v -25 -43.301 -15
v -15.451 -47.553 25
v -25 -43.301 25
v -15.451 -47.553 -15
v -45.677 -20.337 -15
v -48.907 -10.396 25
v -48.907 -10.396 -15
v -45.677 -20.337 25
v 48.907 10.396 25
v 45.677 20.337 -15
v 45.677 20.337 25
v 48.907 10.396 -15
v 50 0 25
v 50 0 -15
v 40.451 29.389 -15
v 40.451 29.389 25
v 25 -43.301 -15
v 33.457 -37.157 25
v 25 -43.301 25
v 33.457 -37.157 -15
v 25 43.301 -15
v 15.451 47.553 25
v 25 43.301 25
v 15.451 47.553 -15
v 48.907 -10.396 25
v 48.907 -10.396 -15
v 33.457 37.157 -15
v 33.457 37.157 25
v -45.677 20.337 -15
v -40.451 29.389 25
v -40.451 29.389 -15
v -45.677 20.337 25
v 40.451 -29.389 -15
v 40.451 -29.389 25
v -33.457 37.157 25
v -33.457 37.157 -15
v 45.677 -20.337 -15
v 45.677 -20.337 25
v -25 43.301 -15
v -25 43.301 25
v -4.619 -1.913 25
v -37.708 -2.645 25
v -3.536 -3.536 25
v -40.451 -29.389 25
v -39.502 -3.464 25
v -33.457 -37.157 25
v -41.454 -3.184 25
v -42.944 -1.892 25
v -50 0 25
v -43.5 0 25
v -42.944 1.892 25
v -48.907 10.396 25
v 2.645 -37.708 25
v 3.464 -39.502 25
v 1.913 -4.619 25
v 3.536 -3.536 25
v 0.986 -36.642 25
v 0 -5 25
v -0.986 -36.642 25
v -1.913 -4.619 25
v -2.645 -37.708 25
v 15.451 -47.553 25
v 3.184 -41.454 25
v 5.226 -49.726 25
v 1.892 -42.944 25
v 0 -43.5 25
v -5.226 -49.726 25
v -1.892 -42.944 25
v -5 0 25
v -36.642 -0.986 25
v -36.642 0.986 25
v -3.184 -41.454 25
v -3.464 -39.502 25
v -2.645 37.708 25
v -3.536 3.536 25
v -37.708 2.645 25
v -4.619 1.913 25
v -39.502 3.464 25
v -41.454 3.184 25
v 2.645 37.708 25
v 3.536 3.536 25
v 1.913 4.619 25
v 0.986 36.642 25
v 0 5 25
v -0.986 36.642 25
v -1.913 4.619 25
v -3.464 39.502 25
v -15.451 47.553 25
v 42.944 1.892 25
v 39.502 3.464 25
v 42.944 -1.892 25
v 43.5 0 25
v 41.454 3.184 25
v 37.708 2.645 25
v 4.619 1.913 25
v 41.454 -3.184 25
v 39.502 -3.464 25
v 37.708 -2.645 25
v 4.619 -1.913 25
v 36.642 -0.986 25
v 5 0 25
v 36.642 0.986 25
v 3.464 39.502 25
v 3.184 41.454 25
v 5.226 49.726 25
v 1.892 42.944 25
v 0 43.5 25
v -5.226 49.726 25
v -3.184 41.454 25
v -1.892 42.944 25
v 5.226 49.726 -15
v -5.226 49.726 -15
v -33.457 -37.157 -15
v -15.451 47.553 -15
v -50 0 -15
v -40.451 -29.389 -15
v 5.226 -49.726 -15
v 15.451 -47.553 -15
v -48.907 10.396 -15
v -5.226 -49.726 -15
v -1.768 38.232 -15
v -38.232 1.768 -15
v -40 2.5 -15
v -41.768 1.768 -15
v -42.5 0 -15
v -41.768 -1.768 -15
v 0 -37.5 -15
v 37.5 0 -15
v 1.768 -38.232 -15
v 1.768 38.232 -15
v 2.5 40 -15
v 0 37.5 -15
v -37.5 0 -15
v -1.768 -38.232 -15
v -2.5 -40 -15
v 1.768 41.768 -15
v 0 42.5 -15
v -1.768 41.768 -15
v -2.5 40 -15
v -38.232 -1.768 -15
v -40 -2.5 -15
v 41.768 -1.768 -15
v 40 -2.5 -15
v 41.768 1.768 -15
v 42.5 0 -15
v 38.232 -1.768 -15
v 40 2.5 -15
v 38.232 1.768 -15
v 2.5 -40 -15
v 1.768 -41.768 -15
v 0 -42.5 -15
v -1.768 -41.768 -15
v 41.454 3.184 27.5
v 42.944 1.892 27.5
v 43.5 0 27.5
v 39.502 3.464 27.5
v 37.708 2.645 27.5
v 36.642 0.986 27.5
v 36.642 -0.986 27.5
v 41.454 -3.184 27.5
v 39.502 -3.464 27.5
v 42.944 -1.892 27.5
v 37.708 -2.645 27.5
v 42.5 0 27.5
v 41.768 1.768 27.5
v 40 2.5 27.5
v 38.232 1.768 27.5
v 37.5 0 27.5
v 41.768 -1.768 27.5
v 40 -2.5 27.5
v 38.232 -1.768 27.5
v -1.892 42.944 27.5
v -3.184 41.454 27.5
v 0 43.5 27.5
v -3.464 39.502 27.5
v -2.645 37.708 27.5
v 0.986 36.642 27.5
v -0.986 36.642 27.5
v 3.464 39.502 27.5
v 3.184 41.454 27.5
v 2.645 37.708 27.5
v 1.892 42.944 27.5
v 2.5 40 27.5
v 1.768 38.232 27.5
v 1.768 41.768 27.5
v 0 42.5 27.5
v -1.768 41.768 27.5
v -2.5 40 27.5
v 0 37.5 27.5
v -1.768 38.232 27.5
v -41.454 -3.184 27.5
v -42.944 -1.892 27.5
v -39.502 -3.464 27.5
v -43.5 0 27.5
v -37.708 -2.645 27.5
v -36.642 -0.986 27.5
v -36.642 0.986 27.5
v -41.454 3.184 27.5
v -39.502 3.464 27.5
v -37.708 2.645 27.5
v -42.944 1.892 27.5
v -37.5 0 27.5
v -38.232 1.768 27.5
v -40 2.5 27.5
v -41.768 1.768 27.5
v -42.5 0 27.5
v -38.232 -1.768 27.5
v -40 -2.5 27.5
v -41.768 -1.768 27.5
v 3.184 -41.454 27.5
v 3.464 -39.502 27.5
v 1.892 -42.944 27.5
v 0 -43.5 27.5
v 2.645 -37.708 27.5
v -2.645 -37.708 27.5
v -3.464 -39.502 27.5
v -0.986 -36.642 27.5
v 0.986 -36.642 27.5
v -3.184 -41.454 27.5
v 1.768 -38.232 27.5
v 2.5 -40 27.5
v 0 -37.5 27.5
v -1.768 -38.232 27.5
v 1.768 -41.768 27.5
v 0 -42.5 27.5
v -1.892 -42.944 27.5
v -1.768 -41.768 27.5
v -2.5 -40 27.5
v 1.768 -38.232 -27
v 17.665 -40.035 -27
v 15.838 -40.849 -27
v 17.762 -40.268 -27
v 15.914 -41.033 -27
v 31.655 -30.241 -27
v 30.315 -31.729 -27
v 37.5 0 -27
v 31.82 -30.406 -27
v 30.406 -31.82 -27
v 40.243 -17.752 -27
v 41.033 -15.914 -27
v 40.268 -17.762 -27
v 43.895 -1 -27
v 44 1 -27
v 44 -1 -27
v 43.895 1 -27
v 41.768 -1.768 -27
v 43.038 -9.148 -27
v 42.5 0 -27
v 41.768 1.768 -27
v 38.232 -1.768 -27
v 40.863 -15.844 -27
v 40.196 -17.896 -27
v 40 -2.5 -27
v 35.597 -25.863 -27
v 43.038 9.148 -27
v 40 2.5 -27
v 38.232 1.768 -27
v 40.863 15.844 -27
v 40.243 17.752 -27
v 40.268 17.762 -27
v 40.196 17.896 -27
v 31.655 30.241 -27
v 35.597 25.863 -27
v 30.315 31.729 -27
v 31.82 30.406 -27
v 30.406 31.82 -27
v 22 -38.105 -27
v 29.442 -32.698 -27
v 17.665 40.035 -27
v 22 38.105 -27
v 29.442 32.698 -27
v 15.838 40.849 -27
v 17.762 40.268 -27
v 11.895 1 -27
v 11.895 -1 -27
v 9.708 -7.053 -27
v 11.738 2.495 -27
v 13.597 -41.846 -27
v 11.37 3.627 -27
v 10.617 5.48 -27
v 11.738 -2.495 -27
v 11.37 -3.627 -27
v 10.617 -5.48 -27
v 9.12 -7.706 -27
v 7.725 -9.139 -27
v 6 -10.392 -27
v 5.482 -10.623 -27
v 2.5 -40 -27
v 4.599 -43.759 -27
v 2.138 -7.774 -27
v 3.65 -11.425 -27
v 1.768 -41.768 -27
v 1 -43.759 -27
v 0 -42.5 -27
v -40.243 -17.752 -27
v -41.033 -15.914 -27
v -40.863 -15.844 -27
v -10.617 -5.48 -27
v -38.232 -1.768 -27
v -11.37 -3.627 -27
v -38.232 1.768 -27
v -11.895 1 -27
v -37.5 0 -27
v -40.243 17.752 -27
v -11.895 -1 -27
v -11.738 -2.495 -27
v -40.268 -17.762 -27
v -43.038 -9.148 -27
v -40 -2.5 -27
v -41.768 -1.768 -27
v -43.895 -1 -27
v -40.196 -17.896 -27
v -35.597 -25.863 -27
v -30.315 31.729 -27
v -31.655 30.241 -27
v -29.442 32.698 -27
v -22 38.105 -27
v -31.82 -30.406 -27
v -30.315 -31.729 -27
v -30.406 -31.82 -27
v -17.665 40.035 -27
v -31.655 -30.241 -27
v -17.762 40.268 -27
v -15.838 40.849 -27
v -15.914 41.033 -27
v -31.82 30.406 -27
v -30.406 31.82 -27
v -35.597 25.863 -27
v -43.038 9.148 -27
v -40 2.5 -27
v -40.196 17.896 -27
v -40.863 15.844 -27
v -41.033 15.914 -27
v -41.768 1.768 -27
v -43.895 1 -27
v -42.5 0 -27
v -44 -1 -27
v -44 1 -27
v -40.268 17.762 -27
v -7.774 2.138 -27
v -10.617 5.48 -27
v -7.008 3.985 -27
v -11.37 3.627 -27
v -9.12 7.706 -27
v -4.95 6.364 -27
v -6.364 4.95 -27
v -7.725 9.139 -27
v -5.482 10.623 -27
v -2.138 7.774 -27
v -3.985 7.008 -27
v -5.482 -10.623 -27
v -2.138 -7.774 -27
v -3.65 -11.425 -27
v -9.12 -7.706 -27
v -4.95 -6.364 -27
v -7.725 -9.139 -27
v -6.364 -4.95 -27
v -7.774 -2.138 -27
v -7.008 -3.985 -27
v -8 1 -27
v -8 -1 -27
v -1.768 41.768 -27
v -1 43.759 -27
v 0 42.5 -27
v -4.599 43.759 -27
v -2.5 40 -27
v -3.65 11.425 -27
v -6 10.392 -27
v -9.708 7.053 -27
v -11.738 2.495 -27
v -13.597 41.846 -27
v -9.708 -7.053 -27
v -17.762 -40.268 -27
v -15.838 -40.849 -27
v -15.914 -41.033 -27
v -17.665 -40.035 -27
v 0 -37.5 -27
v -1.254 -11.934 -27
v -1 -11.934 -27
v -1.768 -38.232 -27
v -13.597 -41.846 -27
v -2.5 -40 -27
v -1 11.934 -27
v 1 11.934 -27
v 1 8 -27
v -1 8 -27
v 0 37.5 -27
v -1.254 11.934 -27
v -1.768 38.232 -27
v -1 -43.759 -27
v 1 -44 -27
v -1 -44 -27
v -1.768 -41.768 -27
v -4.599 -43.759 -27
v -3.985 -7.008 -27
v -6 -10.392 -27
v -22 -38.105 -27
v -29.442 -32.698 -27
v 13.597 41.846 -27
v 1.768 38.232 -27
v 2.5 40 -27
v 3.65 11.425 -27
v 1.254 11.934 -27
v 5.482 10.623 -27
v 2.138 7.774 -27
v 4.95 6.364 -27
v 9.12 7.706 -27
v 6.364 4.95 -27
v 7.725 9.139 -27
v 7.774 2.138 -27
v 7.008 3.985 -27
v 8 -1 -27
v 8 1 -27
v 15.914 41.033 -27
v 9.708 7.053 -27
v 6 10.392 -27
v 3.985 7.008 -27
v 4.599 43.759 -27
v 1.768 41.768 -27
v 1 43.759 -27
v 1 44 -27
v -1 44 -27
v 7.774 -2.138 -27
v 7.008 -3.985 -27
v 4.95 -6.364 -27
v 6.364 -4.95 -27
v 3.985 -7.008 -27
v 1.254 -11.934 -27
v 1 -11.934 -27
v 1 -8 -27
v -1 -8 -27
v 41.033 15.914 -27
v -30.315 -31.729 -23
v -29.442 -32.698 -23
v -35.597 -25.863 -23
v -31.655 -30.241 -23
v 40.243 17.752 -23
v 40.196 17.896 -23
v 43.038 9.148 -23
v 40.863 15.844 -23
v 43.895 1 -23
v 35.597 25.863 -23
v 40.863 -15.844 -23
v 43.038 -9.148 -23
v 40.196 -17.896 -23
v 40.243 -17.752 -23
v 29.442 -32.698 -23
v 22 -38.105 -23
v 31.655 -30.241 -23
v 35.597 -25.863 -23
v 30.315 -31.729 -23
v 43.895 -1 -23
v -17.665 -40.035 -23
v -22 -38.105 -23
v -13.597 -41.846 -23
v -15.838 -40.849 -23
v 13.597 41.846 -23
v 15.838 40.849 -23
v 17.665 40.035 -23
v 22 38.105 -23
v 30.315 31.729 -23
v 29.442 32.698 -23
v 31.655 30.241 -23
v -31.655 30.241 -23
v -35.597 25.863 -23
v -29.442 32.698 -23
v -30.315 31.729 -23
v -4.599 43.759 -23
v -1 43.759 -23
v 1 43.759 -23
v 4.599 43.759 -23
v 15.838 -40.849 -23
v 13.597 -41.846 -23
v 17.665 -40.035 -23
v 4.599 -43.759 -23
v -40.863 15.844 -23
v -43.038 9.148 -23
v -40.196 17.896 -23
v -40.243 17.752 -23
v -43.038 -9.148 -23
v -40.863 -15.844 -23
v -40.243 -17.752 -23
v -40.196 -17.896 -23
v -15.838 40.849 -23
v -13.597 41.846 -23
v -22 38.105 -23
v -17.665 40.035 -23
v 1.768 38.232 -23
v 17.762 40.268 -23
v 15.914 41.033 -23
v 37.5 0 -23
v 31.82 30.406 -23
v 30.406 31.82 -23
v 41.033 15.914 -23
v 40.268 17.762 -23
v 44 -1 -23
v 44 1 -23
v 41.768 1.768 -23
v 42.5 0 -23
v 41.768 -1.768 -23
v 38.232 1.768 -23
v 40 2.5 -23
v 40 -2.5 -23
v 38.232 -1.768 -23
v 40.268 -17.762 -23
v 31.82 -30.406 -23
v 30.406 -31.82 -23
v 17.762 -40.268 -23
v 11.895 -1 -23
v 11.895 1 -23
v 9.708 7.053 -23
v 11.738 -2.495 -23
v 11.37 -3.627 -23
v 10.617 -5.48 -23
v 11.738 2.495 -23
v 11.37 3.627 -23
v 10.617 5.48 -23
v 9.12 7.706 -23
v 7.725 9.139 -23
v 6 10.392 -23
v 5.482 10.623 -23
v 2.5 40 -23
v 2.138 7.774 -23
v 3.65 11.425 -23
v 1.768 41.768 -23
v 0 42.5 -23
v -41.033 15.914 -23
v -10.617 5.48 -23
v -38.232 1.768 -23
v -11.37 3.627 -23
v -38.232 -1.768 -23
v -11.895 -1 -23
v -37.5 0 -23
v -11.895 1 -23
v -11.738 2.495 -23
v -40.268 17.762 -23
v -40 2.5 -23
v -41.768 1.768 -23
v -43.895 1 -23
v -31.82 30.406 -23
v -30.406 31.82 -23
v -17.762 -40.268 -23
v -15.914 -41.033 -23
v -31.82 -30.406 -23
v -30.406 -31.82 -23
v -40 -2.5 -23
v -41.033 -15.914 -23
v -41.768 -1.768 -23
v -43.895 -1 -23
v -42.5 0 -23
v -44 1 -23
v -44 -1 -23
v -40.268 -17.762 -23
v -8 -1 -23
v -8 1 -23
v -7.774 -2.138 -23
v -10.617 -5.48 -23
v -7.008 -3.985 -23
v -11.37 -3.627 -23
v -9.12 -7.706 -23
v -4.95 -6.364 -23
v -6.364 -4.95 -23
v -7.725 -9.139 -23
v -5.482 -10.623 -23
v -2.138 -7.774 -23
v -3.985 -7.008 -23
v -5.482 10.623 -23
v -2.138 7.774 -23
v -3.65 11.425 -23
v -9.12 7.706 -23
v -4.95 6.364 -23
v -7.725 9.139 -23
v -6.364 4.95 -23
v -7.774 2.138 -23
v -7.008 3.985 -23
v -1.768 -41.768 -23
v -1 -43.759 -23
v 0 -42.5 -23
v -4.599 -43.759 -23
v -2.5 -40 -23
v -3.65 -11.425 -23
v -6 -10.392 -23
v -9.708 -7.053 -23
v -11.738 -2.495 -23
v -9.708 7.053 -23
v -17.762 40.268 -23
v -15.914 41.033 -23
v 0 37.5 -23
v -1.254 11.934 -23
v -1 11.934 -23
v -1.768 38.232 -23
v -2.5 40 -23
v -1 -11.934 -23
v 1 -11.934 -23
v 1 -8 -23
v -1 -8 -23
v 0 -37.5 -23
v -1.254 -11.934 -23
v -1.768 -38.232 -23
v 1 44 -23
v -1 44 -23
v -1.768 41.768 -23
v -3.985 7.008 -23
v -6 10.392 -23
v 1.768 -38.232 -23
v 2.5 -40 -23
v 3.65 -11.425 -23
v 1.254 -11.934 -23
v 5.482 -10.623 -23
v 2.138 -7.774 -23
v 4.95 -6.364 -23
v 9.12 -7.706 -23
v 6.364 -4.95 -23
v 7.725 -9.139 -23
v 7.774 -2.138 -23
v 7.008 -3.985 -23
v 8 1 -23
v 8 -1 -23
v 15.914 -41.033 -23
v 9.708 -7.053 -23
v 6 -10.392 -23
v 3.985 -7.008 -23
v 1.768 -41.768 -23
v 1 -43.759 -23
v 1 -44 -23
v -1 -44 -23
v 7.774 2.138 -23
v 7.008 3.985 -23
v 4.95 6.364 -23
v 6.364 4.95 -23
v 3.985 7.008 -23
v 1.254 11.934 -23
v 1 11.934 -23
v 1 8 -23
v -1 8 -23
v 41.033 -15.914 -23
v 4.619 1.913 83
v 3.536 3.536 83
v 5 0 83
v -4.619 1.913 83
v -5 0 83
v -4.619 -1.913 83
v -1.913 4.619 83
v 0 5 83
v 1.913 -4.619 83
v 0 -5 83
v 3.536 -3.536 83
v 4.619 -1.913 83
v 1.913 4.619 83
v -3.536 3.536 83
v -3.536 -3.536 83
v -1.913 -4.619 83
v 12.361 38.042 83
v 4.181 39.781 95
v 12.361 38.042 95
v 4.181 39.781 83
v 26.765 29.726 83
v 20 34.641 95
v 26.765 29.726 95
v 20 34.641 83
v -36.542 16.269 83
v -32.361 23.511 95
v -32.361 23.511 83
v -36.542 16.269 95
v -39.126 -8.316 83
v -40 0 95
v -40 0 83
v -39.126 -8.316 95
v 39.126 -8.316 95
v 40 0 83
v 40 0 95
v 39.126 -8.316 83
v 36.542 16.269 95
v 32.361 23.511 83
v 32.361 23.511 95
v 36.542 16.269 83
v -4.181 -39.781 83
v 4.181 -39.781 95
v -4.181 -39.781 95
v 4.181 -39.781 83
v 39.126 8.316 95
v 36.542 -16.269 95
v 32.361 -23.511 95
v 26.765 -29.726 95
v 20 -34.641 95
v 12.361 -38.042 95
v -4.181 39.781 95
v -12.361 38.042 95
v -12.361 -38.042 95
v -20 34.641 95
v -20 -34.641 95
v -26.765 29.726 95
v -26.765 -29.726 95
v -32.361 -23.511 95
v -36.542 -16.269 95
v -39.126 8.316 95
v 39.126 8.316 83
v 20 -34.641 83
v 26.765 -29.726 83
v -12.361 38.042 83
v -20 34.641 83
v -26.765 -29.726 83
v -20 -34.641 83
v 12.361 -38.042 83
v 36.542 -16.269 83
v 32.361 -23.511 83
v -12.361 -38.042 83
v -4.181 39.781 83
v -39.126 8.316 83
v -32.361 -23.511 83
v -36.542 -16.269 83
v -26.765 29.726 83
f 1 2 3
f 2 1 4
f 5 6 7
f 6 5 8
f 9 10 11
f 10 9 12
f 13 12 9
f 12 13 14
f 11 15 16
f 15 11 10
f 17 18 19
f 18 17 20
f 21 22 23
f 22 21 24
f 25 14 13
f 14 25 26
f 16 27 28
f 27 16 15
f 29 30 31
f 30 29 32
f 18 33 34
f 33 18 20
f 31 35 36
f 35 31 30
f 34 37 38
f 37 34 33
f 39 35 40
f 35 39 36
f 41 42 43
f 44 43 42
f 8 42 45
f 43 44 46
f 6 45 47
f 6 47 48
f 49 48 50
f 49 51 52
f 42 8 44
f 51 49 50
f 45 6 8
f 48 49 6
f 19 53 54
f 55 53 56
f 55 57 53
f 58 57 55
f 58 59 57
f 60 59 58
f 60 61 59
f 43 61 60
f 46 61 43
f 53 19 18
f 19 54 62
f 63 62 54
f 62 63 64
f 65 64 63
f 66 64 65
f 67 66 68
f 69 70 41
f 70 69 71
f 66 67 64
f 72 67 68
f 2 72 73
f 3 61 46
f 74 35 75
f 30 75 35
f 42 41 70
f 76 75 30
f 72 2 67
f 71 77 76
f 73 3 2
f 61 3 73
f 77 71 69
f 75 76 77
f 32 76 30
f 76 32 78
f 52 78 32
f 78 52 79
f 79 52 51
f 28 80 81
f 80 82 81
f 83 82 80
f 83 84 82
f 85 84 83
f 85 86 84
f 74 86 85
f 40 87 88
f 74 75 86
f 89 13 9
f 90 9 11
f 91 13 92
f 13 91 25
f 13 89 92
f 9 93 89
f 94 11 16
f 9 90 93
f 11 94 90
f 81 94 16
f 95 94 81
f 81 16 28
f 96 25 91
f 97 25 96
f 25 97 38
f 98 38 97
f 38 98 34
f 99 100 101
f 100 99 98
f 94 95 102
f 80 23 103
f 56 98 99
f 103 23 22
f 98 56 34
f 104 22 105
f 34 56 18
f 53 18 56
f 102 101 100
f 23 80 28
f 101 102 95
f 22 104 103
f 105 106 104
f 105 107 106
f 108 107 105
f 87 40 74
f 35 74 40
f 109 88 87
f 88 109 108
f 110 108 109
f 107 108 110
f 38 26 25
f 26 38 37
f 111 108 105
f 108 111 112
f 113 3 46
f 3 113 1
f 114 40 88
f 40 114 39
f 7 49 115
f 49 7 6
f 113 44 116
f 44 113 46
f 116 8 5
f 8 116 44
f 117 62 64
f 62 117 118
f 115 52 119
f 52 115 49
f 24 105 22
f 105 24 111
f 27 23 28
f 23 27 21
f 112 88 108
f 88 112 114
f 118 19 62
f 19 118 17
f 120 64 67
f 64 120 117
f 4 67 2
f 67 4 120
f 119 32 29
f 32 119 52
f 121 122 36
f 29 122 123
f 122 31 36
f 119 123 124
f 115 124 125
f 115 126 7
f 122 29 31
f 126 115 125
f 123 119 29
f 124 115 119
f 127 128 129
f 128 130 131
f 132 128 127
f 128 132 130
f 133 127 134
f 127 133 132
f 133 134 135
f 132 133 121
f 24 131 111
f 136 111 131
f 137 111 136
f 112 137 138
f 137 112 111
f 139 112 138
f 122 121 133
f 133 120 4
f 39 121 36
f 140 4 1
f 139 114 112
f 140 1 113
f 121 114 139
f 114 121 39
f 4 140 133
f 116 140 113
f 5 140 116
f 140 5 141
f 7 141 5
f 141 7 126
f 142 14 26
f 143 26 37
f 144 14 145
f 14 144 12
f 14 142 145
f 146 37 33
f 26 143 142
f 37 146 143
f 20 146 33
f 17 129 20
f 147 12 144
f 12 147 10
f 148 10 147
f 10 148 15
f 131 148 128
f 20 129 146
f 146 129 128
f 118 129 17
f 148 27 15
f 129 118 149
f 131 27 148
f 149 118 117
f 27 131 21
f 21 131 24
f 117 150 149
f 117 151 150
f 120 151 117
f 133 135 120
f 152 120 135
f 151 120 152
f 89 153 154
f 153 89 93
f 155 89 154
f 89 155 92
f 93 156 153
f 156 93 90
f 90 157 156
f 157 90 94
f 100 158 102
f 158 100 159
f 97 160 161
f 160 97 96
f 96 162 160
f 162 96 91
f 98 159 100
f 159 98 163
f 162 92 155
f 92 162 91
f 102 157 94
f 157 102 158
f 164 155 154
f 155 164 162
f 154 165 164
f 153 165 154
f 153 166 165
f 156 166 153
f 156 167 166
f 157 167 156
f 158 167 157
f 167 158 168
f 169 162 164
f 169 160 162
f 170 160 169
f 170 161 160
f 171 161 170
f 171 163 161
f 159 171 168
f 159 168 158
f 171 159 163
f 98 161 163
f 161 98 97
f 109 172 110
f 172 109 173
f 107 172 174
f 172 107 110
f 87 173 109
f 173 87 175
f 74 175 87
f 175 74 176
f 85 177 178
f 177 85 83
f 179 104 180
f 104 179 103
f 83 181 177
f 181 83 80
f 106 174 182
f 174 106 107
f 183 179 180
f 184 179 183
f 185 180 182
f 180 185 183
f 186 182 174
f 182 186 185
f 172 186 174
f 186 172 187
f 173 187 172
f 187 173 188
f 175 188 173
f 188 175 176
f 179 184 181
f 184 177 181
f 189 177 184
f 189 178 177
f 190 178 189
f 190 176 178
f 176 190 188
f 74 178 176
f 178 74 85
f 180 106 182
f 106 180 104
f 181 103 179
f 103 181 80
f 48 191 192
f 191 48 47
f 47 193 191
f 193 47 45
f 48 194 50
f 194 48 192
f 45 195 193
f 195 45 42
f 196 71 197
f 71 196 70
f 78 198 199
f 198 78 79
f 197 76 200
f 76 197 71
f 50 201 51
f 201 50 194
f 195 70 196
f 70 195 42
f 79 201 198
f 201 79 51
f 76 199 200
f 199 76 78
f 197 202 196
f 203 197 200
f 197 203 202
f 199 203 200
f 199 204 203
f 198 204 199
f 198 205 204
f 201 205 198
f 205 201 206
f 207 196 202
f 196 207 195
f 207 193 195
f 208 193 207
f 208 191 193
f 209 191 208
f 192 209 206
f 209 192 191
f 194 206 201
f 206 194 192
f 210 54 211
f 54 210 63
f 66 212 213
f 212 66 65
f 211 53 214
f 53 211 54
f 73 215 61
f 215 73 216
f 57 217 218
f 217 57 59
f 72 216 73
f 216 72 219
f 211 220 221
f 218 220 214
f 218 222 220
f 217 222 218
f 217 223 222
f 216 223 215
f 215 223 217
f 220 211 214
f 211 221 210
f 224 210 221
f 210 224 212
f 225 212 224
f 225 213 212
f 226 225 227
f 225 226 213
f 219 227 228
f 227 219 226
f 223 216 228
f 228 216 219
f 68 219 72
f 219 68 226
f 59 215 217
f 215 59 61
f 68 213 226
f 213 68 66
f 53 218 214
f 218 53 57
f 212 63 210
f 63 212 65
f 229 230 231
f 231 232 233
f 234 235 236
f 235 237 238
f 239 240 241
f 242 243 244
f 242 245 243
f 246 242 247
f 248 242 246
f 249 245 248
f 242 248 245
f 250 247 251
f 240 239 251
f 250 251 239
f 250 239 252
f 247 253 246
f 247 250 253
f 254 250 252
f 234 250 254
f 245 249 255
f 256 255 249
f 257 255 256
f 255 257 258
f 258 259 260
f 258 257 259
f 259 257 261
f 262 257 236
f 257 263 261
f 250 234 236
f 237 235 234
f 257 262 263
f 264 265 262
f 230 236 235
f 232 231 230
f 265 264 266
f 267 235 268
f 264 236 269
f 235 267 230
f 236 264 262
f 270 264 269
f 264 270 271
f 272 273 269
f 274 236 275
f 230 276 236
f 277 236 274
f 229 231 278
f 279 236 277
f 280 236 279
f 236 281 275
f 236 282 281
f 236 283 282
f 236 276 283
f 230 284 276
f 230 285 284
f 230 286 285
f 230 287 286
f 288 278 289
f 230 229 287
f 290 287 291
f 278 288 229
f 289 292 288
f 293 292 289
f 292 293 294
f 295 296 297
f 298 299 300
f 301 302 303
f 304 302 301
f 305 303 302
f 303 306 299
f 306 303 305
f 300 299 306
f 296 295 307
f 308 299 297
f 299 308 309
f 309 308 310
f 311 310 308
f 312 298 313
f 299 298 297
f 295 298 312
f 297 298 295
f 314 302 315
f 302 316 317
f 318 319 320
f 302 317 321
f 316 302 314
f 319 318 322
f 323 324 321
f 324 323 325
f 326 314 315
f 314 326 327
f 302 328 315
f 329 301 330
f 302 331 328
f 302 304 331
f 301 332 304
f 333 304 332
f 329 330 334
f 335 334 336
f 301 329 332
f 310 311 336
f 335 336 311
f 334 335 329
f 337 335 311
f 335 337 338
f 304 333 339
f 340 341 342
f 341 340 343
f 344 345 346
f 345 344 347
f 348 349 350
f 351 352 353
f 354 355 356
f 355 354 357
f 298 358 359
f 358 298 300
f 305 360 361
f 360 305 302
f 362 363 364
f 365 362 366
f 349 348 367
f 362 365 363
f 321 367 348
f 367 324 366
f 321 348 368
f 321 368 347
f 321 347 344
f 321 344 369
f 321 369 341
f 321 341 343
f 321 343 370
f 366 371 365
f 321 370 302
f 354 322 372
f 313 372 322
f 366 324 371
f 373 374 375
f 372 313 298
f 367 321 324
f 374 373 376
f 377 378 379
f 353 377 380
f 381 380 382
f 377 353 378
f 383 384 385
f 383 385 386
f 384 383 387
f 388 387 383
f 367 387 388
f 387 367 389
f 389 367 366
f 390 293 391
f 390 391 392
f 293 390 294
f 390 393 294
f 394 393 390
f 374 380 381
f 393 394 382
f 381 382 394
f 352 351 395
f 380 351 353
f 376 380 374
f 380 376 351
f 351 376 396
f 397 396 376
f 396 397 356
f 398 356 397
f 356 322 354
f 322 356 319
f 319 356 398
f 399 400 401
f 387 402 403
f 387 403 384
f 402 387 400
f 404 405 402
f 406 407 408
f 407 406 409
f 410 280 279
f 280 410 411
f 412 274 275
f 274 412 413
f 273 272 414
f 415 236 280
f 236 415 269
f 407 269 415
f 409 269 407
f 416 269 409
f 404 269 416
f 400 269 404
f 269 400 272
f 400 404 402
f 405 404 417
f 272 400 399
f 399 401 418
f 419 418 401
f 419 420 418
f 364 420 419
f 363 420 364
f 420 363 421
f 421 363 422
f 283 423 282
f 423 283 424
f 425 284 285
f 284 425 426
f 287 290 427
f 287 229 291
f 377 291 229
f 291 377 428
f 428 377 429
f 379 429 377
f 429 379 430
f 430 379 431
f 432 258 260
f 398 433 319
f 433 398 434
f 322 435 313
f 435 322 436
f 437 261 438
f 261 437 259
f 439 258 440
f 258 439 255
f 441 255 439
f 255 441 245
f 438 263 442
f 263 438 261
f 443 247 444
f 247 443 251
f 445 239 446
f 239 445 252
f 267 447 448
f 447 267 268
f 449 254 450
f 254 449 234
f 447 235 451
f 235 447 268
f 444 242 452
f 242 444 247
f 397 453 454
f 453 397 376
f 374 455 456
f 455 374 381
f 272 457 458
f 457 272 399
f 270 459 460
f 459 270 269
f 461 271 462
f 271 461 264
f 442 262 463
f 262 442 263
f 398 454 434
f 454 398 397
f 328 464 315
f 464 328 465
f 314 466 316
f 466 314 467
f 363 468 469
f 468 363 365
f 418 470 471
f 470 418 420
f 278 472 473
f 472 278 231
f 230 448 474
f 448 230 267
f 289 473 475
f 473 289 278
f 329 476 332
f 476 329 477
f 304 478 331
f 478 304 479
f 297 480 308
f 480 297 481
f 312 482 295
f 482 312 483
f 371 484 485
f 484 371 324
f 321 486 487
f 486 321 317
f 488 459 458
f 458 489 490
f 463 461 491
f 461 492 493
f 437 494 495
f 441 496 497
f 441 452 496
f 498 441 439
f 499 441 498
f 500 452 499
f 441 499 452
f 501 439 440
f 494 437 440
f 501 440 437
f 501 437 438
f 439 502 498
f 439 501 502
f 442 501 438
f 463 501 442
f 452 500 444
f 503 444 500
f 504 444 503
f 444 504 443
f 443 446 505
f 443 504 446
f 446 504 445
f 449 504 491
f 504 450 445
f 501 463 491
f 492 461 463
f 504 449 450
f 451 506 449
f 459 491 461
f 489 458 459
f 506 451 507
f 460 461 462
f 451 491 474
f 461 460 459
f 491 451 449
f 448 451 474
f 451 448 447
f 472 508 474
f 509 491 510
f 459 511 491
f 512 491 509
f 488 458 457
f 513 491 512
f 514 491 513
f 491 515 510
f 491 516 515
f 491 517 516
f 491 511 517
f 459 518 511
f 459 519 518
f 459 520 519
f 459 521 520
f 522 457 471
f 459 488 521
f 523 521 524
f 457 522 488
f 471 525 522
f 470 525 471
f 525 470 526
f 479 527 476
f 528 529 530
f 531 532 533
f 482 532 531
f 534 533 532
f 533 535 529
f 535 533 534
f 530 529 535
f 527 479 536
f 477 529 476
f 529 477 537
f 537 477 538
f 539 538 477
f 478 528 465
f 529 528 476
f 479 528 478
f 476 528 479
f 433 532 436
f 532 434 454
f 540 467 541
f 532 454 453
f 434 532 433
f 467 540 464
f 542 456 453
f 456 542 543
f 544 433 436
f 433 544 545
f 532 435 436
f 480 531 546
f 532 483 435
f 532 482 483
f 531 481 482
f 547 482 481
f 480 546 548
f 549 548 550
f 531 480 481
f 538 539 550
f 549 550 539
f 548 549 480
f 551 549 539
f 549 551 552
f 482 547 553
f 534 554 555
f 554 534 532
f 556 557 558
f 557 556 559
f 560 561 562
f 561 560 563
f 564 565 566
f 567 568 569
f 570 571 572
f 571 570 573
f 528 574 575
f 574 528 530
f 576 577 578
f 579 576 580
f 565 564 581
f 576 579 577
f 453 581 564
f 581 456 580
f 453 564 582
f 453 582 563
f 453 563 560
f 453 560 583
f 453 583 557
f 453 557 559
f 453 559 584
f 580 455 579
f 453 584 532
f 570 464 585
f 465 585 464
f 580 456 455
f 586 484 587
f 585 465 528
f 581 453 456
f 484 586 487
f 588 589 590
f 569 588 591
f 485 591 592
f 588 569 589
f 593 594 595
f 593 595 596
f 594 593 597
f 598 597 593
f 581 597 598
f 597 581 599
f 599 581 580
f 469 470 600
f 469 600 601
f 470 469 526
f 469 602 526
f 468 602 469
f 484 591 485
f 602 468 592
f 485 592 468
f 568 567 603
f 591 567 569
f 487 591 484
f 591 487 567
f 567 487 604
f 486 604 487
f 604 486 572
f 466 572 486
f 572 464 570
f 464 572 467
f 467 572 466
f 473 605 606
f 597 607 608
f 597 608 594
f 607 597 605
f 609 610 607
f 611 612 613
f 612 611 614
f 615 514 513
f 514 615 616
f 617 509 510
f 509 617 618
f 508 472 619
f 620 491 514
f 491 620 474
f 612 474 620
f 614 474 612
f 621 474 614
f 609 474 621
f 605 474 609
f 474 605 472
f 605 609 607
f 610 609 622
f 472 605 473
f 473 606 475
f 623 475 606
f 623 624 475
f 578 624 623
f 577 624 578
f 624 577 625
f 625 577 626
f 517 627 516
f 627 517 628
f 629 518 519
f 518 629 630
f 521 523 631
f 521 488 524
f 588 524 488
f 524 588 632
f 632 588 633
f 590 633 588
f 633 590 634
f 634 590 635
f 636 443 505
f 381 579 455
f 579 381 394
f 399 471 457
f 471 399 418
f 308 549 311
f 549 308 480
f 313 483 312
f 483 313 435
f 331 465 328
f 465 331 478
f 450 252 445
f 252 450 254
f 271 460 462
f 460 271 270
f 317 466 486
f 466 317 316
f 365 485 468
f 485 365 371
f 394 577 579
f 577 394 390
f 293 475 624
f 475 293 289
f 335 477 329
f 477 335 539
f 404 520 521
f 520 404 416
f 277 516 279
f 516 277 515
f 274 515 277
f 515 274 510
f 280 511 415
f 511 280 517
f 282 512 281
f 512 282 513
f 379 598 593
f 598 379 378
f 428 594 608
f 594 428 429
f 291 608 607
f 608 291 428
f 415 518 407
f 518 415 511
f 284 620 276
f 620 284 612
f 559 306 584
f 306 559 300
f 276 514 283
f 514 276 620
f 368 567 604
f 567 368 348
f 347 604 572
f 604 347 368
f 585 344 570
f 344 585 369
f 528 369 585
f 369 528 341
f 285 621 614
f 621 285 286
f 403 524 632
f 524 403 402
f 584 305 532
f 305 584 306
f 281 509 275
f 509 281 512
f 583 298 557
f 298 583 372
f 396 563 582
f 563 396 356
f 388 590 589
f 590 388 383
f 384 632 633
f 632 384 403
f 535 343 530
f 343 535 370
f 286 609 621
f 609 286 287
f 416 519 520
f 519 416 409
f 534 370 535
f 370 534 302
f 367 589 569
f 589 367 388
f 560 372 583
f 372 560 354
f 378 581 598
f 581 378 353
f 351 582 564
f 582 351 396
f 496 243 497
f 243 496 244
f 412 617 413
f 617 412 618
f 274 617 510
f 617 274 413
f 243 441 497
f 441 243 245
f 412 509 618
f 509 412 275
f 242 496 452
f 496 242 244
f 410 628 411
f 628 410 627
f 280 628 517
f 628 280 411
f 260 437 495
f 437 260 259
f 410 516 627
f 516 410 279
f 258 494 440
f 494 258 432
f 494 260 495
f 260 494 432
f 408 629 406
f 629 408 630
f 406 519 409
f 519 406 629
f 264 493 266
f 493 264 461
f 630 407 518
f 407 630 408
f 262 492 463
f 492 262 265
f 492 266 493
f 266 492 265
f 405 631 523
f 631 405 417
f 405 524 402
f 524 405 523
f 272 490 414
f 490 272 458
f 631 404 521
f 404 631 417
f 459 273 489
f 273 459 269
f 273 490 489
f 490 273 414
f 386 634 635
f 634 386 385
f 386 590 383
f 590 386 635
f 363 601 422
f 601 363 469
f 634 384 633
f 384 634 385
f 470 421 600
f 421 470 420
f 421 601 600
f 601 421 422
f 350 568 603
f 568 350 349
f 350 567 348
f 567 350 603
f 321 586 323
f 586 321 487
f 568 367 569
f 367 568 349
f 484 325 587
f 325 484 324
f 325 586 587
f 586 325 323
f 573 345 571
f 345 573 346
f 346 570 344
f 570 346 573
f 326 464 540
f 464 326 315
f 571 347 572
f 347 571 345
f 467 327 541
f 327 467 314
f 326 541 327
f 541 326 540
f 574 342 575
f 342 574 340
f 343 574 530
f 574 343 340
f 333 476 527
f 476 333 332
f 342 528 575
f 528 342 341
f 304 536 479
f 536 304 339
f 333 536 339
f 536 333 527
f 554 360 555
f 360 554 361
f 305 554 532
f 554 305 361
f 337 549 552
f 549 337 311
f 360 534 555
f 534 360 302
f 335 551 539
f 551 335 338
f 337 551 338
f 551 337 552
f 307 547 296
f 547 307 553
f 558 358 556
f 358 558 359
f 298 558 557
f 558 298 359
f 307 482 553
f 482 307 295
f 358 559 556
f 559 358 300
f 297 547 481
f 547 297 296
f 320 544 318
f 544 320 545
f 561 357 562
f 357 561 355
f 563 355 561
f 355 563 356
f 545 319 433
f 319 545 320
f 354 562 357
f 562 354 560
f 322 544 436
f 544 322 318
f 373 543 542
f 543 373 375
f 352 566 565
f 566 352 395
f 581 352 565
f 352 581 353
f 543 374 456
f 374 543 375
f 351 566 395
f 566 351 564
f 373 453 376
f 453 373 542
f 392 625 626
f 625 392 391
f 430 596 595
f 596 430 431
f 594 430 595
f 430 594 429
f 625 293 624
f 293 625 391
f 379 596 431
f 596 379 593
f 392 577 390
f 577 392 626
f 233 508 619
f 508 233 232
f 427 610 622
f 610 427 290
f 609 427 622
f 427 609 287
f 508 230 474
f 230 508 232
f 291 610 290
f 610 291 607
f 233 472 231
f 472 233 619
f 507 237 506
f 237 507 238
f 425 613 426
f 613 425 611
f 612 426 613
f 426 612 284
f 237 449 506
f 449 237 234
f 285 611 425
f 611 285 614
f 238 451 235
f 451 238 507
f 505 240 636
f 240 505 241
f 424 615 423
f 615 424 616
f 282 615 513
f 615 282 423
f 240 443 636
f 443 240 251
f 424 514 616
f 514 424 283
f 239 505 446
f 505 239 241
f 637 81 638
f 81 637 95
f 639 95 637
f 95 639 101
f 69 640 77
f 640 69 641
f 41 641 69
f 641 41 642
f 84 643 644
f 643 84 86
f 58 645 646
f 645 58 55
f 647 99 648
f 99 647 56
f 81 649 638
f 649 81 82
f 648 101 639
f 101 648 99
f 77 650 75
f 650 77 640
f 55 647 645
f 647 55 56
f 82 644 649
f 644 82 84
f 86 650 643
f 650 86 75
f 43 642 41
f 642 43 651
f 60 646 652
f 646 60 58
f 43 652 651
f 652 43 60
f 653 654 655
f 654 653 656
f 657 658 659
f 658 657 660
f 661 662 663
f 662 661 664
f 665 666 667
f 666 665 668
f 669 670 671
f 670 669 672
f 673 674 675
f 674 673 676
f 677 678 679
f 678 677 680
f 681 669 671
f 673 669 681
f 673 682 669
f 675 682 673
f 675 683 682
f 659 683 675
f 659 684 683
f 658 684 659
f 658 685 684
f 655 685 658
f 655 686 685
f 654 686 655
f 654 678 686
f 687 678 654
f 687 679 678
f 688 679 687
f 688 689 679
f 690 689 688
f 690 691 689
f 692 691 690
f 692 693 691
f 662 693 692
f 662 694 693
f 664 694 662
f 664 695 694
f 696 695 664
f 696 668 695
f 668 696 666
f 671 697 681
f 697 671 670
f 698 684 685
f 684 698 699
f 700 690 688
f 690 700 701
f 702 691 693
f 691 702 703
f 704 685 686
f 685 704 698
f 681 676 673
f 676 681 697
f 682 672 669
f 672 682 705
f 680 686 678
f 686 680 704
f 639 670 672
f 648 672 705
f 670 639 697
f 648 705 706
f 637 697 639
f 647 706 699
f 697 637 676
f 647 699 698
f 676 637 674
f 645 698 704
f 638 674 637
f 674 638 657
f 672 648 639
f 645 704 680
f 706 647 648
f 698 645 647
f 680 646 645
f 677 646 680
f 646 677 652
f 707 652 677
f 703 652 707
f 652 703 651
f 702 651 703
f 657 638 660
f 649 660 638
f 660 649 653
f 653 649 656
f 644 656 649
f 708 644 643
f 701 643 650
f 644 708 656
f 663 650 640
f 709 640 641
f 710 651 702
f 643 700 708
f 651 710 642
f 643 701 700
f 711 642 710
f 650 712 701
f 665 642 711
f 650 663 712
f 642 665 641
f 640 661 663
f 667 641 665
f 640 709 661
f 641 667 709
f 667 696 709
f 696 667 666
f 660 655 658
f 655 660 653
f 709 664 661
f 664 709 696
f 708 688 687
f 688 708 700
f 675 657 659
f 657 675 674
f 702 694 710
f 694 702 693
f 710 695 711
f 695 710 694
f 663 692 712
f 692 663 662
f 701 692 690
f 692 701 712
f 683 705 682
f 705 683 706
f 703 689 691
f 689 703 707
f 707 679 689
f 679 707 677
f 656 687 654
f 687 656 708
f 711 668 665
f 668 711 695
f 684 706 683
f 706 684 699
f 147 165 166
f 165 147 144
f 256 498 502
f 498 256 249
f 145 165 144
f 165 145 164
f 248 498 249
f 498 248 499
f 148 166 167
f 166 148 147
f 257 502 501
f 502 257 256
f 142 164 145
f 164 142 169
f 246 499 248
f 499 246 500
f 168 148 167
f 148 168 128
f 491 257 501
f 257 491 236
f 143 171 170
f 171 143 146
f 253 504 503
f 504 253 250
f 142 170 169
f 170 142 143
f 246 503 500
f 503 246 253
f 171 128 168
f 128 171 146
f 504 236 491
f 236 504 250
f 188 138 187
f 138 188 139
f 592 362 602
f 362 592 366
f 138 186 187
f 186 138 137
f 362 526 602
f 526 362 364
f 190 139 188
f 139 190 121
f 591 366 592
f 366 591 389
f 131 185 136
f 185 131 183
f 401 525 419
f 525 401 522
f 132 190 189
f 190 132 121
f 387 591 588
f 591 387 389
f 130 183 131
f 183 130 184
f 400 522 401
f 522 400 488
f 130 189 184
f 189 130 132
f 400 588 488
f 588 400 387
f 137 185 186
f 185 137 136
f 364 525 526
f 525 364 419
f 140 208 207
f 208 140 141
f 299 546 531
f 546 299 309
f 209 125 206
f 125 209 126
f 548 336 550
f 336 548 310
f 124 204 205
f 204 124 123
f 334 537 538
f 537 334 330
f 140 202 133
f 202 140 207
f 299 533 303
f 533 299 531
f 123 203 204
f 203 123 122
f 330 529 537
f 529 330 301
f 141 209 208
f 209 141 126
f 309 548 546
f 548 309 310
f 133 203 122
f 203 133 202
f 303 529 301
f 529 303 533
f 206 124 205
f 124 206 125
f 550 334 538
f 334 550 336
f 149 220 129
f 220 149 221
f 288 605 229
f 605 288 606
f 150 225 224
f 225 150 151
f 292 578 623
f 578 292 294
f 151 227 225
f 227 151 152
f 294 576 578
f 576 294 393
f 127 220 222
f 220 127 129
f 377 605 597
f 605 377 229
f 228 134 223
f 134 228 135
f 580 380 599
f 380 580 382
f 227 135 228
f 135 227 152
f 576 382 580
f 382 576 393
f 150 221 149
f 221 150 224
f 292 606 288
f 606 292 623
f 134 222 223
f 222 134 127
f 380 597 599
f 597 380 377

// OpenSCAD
// Parameters
variac_diameter = 100;
variac_height = 50;
bulge_diameter = 120;
bulge_height = 10;
shaft_diameter = 10;
shaft_height = 60;
mounting_hole_diameter = 5;
mounting_hole_radius = 40;
top_face_thickness = 5;
dial_diameter = 80;
dial_height = 10;

// Connectivity overlap (1-2mm) to guarantee attachment
overlap = 2;

// Main variac body (kept as-is structurally)
module variac_body() {
    difference() {
        cylinder(d=variac_diameter, h=variac_height, center=true);
        translate([0, 0, -variac_height/2])
            cylinder(d=bulge_diameter, h=bulge_height, center=false);
    }
}

// Central shaft (overlaps into body)
module shaft() {
    translate([0, 0, variac_height/2 - overlap])
        cylinder(d=shaft_diameter, h=shaft_height + overlap, center=false);
}

// Mounting hole pattern (these are holes; should be used in difference, not union)
module mounting_hole_pattern() {
    for (i = [0:3]) {
        rotate([0, 0, i * 90])
            translate([mounting_hole_radius, 0, 0])
                cylinder(d=mounting_hole_diameter, h=variac_height + 10, center=true);
    }
}

// Screw and washer hardware placeholders (overlap into top face)
module screw_and_washer_hardware_placeholders() {
    for (i = [0:3]) {
        rotate([0, 0, i * 90])
            translate([mounting_hole_radius, 0, variac_height/2 - overlap/2])
                cylinder(d=mounting_hole_diameter + 2, h=5 + overlap, center=true);
    }
}

// Dial/knob assembly (overlaps into shaft)
module dial() {
    translate([0, 0, variac_height/2 + shaft_height - overlap])
        cylinder(d=dial_diameter, h=dial_height + overlap, center=false);
}

// --- Fixed: orange wire/coil elements + guaranteed physical attachment ---
// The coil is now placed so its TOP penetrates into the main body by `overlap`,
// eliminating any visible gap/floating geometry.
module coil_and_attachment() {
    coil_h = 2;                                          // thin coil thickness
    coil_outer_r = (variac_diameter/2) - 6;              // keep within body footprint
    coil_inner_r = 12;                                   // clear center
    spoke_w = 2;
    spoke_len = coil_outer_r - coil_inner_r;
    n_spokes = 16;

    // Place coil so it intersects the body's bottom face by `overlap`
    // Body bottom is at z = -variac_height/2
    // Coil top is at z = coil_z + (coil_h + overlap)
    // Set coil top to (-variac_height/2 + overlap) => coil_z = -variac_height/2 - coil_h
    coil_z = -variac_height/2 - coil_h;

    // Risers that connect coil plane into the body (guaranteed overlap)
    // Start at coil_z and extend upward past the body bottom by `overlap`.
    riser_d = 4;
    riser_h = coil_h + 2*overlap; // reaches into body by overlap and into coil by overlap
    for (i = [0:3]) {
        rotate([0, 0, i * 90])
            translate([mounting_hole_radius, 0, coil_z])
                cylinder(d=riser_d, h=riser_h, center=false);
    }

    // Coil ring (washer-like) that intersects risers and penetrates body by `overlap`
    translate([0, 0, coil_z])
    difference() {
        cylinder(r=coil_outer_r, h=coil_h + overlap, center=false);
        translate([0, 0, -0.1])
            cylinder(r=coil_inner_r, h=coil_h + overlap + 0.2, center=false);
    }

    // Spokes (wire-like elements) that intersect the ring and reach toward center
    for (i = [0:n_spokes-1]) {
        rotate([0, 0, i * 360 / n_spokes])
            translate([coil_inner_r + spoke_len/2 - overlap, 0, coil_z + (coil_h+overlap)/2])
                cube([spoke_len + 2*overlap, spoke_w, coil_h + overlap], center=true);
    }
}

// Complete variac assembly (single connected solid)
// NOTE: mounting_hole_pattern() is a subtractive feature; keep it in difference.
module variac() {
    union() {
        difference() {
            union() {
                variac_body();
                shaft();
                screw_and_washer_hardware_placeholders();
                dial();
                coil_and_attachment(); // now intersects body (no floating / no gap)
            }
            mounting_hole_pattern(); // holes cut through body
        }
    }
}

// Render the variac
variac();
